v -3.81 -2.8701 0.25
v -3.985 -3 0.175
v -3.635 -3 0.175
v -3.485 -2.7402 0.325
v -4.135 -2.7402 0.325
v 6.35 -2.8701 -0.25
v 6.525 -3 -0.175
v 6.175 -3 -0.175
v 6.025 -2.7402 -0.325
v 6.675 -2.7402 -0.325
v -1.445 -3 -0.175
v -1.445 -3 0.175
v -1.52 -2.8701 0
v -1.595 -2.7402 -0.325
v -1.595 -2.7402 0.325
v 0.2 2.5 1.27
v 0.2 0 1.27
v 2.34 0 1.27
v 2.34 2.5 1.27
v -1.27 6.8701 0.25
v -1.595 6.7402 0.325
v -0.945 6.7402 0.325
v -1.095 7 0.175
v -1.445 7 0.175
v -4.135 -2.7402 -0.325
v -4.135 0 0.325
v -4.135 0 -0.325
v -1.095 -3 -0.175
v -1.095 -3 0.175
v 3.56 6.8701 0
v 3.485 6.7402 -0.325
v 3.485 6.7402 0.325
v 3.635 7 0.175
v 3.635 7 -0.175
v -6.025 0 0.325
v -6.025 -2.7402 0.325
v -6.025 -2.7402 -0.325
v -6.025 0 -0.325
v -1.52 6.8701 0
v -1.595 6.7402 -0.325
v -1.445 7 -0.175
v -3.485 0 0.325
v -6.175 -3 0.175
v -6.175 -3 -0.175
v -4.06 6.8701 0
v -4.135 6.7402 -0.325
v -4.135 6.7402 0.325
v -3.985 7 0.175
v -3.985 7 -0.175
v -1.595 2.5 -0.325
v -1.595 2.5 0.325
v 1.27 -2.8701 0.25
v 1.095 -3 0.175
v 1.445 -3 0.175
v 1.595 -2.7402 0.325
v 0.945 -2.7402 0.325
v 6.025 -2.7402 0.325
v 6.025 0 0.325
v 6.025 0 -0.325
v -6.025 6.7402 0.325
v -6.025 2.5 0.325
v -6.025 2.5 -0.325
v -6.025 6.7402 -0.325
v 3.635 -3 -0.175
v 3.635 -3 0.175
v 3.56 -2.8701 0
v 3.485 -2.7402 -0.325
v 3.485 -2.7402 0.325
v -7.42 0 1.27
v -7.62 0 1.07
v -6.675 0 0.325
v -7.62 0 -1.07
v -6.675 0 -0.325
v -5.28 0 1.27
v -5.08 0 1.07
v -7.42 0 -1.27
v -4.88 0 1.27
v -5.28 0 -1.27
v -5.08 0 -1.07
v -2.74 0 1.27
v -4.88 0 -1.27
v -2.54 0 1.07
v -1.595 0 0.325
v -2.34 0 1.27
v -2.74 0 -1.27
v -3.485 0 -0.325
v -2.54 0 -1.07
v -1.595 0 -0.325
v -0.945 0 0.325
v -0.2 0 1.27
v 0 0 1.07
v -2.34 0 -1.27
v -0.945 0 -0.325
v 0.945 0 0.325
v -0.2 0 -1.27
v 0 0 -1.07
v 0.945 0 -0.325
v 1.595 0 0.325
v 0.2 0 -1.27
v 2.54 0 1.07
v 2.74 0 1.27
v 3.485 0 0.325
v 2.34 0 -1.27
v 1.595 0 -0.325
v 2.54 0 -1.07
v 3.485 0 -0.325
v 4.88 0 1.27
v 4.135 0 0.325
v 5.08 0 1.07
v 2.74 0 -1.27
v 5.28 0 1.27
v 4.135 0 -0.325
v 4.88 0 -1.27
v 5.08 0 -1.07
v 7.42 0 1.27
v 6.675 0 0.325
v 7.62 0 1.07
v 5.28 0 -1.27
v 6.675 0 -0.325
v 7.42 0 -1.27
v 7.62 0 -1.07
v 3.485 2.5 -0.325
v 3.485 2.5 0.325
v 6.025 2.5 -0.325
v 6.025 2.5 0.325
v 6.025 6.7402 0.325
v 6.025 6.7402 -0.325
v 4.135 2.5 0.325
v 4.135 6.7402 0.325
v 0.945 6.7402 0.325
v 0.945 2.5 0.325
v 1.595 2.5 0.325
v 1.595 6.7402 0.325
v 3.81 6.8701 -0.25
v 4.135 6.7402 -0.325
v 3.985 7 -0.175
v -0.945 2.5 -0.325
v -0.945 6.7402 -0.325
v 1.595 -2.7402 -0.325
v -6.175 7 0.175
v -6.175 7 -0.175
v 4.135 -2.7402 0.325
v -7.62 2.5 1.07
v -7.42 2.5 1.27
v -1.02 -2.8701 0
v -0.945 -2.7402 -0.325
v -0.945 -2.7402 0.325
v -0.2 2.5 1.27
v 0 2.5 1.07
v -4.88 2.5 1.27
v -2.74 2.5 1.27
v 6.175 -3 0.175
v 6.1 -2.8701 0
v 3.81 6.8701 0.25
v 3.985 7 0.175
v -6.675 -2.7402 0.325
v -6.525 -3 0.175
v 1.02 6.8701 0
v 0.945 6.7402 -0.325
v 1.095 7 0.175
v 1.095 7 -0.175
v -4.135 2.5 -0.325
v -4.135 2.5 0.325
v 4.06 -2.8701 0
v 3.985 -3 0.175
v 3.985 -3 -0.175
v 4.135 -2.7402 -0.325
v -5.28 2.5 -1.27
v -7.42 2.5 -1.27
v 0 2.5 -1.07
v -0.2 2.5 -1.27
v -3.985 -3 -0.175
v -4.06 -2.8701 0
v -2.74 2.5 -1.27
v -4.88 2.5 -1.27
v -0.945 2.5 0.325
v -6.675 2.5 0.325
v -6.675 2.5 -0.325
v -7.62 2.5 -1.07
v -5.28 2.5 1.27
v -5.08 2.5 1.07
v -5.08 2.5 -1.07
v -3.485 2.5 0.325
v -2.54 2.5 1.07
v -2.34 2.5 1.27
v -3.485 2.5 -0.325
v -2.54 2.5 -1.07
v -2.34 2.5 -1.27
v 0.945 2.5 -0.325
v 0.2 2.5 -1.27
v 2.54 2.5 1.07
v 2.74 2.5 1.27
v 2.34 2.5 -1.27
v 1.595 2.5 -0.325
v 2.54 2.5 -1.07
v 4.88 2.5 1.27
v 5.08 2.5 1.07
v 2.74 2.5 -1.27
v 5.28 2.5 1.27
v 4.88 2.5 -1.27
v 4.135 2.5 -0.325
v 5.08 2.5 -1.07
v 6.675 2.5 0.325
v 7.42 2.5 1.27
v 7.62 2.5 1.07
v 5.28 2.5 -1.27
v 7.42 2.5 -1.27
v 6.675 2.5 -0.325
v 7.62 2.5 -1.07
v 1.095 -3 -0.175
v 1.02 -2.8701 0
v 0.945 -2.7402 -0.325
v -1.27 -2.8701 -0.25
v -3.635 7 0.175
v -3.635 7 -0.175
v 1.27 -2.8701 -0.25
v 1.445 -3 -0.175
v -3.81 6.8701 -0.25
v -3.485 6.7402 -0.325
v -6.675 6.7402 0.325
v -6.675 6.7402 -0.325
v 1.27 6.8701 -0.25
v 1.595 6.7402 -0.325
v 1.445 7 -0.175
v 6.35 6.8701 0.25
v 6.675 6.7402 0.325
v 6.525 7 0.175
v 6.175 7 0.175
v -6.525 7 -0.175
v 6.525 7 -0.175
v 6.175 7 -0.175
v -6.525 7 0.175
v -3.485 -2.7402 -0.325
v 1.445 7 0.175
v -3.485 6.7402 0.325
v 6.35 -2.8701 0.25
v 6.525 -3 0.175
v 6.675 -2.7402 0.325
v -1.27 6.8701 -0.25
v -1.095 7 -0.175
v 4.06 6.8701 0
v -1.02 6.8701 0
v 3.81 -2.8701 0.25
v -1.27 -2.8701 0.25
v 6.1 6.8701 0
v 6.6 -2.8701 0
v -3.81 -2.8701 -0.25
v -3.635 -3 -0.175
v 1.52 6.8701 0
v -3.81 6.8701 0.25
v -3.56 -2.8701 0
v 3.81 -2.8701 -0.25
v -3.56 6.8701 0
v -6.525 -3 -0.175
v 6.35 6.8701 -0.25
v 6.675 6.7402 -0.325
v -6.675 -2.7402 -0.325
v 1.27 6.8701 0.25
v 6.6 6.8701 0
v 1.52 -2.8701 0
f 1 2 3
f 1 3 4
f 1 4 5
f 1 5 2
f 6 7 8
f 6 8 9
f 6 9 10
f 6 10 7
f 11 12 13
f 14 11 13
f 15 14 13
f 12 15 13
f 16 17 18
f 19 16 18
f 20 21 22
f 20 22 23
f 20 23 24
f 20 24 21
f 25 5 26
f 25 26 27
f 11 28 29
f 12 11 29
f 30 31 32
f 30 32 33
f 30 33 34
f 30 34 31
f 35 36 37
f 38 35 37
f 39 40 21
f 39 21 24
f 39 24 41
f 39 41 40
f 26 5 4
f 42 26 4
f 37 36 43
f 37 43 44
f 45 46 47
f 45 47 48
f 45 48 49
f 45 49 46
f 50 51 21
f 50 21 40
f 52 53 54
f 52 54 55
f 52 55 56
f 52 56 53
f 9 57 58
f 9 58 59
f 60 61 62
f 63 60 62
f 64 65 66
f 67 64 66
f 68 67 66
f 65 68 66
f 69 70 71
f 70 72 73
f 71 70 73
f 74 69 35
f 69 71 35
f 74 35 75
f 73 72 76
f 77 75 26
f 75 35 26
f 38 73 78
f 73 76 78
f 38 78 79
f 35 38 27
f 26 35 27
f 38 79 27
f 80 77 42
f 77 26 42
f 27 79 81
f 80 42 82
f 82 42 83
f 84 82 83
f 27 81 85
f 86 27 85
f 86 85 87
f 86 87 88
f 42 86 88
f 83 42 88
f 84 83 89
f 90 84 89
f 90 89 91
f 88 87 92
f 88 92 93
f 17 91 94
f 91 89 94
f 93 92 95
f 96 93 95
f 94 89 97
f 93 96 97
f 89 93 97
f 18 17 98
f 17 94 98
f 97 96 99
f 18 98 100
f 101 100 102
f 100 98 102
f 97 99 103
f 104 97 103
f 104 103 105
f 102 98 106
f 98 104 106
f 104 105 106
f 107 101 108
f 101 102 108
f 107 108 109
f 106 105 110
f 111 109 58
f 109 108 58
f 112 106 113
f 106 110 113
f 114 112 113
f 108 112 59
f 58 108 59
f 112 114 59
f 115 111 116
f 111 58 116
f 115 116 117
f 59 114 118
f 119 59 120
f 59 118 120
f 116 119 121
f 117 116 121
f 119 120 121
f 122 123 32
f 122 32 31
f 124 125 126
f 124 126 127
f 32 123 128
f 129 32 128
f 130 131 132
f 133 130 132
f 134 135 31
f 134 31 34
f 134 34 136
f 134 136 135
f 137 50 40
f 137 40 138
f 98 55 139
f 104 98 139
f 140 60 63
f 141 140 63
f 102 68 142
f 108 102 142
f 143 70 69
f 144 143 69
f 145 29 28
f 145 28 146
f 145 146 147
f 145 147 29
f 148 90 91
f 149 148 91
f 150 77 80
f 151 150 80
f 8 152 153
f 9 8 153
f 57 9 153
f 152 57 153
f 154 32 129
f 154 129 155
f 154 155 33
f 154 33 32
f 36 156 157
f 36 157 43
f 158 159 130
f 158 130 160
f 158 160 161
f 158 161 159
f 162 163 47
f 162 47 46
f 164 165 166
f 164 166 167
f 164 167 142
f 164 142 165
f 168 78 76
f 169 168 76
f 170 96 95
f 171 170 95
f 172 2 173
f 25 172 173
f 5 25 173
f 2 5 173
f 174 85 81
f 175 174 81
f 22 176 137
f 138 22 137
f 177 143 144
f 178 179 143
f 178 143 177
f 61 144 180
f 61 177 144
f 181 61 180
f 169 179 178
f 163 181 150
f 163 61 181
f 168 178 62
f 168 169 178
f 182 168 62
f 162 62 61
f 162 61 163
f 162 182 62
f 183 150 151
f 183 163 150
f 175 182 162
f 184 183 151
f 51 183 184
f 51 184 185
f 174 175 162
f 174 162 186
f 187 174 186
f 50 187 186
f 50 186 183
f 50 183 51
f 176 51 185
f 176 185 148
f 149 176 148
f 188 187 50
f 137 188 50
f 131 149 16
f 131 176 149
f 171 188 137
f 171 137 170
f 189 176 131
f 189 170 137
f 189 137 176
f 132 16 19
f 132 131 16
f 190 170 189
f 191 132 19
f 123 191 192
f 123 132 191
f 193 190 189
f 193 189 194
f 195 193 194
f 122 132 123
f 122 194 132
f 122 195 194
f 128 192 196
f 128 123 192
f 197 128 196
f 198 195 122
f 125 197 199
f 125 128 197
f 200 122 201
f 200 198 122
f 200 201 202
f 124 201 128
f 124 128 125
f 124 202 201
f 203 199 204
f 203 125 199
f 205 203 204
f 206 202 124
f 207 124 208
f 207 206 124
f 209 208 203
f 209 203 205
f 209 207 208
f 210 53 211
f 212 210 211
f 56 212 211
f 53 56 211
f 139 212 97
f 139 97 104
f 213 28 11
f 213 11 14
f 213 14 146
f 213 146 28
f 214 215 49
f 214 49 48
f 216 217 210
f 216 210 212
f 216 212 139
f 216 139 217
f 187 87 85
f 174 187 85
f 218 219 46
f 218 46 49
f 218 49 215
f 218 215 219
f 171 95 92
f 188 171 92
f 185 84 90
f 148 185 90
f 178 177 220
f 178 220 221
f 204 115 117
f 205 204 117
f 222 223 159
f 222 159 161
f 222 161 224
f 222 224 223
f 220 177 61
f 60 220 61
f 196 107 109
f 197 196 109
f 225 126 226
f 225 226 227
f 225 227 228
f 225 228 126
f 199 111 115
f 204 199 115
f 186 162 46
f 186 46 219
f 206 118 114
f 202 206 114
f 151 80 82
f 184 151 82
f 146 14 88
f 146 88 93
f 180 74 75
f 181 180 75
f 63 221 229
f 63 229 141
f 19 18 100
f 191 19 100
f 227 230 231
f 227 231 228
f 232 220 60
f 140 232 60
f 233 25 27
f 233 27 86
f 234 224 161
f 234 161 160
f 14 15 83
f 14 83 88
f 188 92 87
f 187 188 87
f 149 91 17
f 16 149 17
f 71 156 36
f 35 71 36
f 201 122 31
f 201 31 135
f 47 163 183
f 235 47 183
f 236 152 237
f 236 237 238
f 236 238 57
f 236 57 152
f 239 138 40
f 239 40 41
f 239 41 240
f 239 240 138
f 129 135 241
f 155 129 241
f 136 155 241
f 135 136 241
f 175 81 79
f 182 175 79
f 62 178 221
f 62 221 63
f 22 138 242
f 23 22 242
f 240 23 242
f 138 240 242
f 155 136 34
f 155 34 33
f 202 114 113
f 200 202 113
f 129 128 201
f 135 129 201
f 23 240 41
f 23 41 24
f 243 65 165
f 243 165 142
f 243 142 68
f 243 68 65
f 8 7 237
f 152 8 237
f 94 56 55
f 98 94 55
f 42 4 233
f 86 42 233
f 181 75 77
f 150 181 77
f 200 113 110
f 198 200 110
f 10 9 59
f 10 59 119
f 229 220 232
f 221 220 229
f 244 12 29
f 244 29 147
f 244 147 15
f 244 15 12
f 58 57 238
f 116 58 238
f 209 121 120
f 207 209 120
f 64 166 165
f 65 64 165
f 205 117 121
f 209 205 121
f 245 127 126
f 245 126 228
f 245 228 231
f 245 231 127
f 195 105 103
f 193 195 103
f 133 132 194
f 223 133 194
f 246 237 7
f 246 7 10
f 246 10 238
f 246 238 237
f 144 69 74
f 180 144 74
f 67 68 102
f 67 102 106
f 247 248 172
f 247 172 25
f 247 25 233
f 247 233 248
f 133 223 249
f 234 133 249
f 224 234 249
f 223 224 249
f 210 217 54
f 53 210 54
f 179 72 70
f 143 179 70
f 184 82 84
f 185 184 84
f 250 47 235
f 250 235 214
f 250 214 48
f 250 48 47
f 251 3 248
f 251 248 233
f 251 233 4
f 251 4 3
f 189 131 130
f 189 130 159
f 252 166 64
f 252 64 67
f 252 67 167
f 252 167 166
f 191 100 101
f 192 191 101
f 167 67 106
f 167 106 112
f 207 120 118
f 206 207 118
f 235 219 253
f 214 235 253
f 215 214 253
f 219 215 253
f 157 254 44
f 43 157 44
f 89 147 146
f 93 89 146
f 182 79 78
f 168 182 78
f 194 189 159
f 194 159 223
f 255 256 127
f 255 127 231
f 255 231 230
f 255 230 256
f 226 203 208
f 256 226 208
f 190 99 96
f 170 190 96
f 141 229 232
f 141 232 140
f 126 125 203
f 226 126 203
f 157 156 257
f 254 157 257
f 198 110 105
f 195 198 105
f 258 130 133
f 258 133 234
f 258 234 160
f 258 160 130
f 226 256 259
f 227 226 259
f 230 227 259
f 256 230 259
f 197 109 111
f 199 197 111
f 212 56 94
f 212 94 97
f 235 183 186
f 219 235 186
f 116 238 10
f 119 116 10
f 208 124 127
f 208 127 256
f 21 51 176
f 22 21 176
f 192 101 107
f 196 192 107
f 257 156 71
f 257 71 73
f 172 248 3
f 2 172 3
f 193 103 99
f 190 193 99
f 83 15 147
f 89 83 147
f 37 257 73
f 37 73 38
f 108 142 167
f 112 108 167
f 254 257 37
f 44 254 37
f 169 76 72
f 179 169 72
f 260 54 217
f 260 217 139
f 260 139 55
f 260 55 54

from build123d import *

# Parameters (mm, degrees)
BOSS_EXTRUDE1_DEPTH   = 2.5
SKETCH3_W             = 0.65
SKETCH3_H             = 0.65
BOSS_EXTRUDE2_DEPTH   = 10
CHAMFER2_SIZE         = 0.15
CHAMFER2_SIZE2        = 0.259807621
CHAMFER3_SIZE         = 0.15
CHAMFER3_SIZE2        = 0.259807621
LPATTERN2_DEPTH       = 2.5
LPATTERN2_START       = -2.740192379
LPATTERN2_2_OUTLINE_W = 0.65
LPATTERN2_2_OUTLINE_H = 0.65
LPATTERN2_2_DEPTH     = 9.480384758


with BuildPart() as part:
    # Sketch1 → Boss-Extrude1 (new body)
    with BuildSketch(Plane(origin=(0, 0, 0), x_dir=(1, 0, 0), z_dir=(0, 1, 0))):
        Polygon((-7.42, 1.27), (-7.62, 1.07), (-7.62, -1.07), (-7.42, -1.27), (-5.28, -1.27), (-5.08, -1.07), (-5.08, 1.07), (-5.28, 1.27), align=None)
    extrude(amount=BOSS_EXTRUDE1_DEPTH)

    # Sketch3 → Boss-Extrude2 (add)
    with BuildSketch(Plane(origin=(0, -3, 0), x_dir=(1, 0, 0), z_dir=(0, 1, 0))):
        with Locations((-6.35, 0)):
            Rectangle(SKETCH3_W, SKETCH3_H)
    extrude(amount=BOSS_EXTRUDE2_DEPTH)

    # Chamfer2
    chamfer2_edges = [part.edges().sort_by_distance(p)[0] for p in [
        (-6.025, -3, 0),
        (-6.35, -3, -0.325),
        (-6.675, -3, 0),
        (-6.35, -3, 0.325),
    ]]
    chamfer2_side = [part.faces().sort_by_distance(p)[0] for p in [
        (-6.35, -3, 0),
    ]]
    chamfer(chamfer2_edges, length=CHAMFER2_SIZE, length2=CHAMFER2_SIZE2, reference=chamfer2_side[0])

    # Chamfer3
    chamfer3_edges = [part.edges().sort_by_distance(p)[0] for p in [
        (-6.025, 7, 0),
        (-6.35, 7, -0.325),
        (-6.675, 7, 0),
        (-6.35, 7, 0.325),
    ]]
    chamfer3_side = [part.faces().sort_by_distance(p)[0] for p in [
        (-6.35, 7, 0),
    ]]
    chamfer(chamfer3_edges, length=CHAMFER3_SIZE, length2=CHAMFER3_SIZE2, reference=chamfer3_side[0])

    # LPattern2: read off the stored shape, not the designer's step
    # LPattern2 outline → LPattern2 (add)
    with BuildSketch(Plane(origin=(0, 0, 0), x_dir=(1, 0, 0), z_dir=(0, 1, 0))):
        Polygon((-2.74, 1.27), (-4.88, 1.27), (-5.08, 1.07), (-5.08, -1.07), (-4.88, -1.27), (-2.74, -1.27), (-2.54, -1.07), (-2.34, -1.27), (-0.2, -1.27), (0, -1.07), (0.2, -1.27), (2.34, -1.27), (2.54, -1.07), (2.74, -1.27), (4.88, -1.27), (5.08, -1.07), (5.28, -1.27), (7.42, -1.27), (7.62, -1.07), (7.62, 1.07), (7.42, 1.27), (5.28, 1.27), (5.08, 1.07), (4.88, 1.27), (2.74, 1.27), (2.54, 1.07), (2.34, 1.27), (0.2, 1.27), (0, 1.07), (-0.2, 1.27), (-2.34, 1.27), (-2.54, 1.07), align=None)
    extrude(amount=LPATTERN2_DEPTH)

    # LPattern2 2 outline → LPattern2 2 (add)
    with BuildSketch(Plane(origin=(0, 0, 0), x_dir=(1, 0, 0), z_dir=(0, 1, 0)).offset(LPATTERN2_START)):
        with Locations((-3.81, 0)):
            Rectangle(LPATTERN2_2_OUTLINE_W, LPATTERN2_2_OUTLINE_H)
        with Locations((-1.27, 0)):
            Rectangle(LPATTERN2_2_OUTLINE_W, LPATTERN2_2_OUTLINE_H)
        with Locations((1.27, 0)):
            Rectangle(LPATTERN2_2_OUTLINE_W, LPATTERN2_2_OUTLINE_H)
        with Locations((3.81, 0)):
            Rectangle(LPATTERN2_2_OUTLINE_W, LPATTERN2_2_OUTLINE_H)
        with Locations((6.35, 0)):
            Rectangle(LPATTERN2_2_OUTLINE_W, LPATTERN2_2_OUTLINE_H)
    extrude(amount=LPATTERN2_2_DEPTH)

    # LPattern2 3: loft between two sections, ruled curve by curve
    lpattern2_3_from = [
        Edge.make_line((-3.985, -3, 0.175), (-3.635, -3, 0.175)),
        Edge.make_line((-3.635, -3, -0.175), (-3.985, -3, -0.175)),
        Edge.make_line((-3.635, -3, 0.175), (-3.635, -3, -0.175)),
        Edge.make_line((-3.985, -3, 0.175), (-3.985, -3, -0.175)),
    ]
    lpattern2_3_to = [
        Edge.make_line((-4.135, -2.740192379, 0.325), (-3.485, -2.740192379, 0.325)),
        Edge.make_line((-3.485, -2.740192379, -0.325), (-4.135, -2.740192379, -0.325)),
        Edge.make_line((-3.485, -2.740192379, 0.325), (-3.485, -2.740192379, -0.325)),
        Edge.make_line((-4.135, -2.740192379, 0.325), (-4.135, -2.740192379, -0.325)),
    ]
    lpattern2_3 = Solid(Shell([*[Face.make_surface_from_curves(lpattern2_3_from[k], lpattern2_3_to[k]) for k in range(4)], Face(Wire(lpattern2_3_from)), Face(Wire(lpattern2_3_to))]))
    add(lpattern2_3)

    # LPattern2 4: loft between two sections, ruled curve by curve
    lpattern2_4_from = [
        Edge.make_line((-1.445, -3, 0.175), (-1.095, -3, 0.175)),
        Edge.make_line((-1.095, -3, -0.175), (-1.445, -3, -0.175)),
        Edge.make_line((-1.095, -3, 0.175), (-1.095, -3, -0.175)),
        Edge.make_line((-1.445, -3, 0.175), (-1.445, -3, -0.175)),
    ]
    lpattern2_4_to = [
        Edge.make_line((-1.595, -2.740192379, 0.325), (-0.945, -2.740192379, 0.325)),
        Edge.make_line((-0.945, -2.740192379, -0.325), (-1.595, -2.740192379, -0.325)),
        Edge.make_line((-0.945, -2.740192379, 0.325), (-0.945, -2.740192379, -0.325)),
        Edge.make_line((-1.595, -2.740192379, 0.325), (-1.595, -2.740192379, -0.325)),
    ]
    lpattern2_4 = Solid(Shell([*[Face.make_surface_from_curves(lpattern2_4_from[k], lpattern2_4_to[k]) for k in range(4)], Face(Wire(lpattern2_4_from)), Face(Wire(lpattern2_4_to))]))
    add(lpattern2_4)

    # LPattern2 5: loft between two sections, ruled curve by curve
    lpattern2_5_from = [
        Edge.make_line((1.095, -3, 0.175), (1.445, -3, 0.175)),
        Edge.make_line((1.445, -3, -0.175), (1.095, -3, -0.175)),
        Edge.make_line((1.445, -3, 0.175), (1.445, -3, -0.175)),
        Edge.make_line((1.095, -3, 0.175), (1.095, -3, -0.175)),
    ]
    lpattern2_5_to = [
        Edge.make_line((0.945, -2.740192379, 0.325), (1.595, -2.740192379, 0.325)),
        Edge.make_line((1.595, -2.740192379, -0.325), (0.945, -2.740192379, -0.325)),
        Edge.make_line((1.595, -2.740192379, 0.325), (1.595, -2.740192379, -0.325)),
        Edge.make_line((0.945, -2.740192379, 0.325), (0.945, -2.740192379, -0.325)),
    ]
    lpattern2_5 = Solid(Shell([*[Face.make_surface_from_curves(lpattern2_5_from[k], lpattern2_5_to[k]) for k in range(4)], Face(Wire(lpattern2_5_from)), Face(Wire(lpattern2_5_to))]))
    add(lpattern2_5)

    # LPattern2 6: loft between two sections, ruled curve by curve
    lpattern2_6_from = [
        Edge.make_line((3.635, -3, 0.175), (3.985, -3, 0.175)),
        Edge.make_line((3.985, -3, -0.175), (3.635, -3, -0.175)),
        Edge.make_line((3.985, -3, 0.175), (3.985, -3, -0.175)),
        Edge.make_line((3.635, -3, 0.175), (3.635, -3, -0.175)),
    ]
    lpattern2_6_to = [
        Edge.make_line((3.485, -2.740192379, 0.325), (4.135, -2.740192379, 0.325)),
        Edge.make_line((4.135, -2.740192379, -0.325), (3.485, -2.740192379, -0.325)),
        Edge.make_line((4.135, -2.740192379, 0.325), (4.135, -2.740192379, -0.325)),
        Edge.make_line((3.485, -2.740192379, 0.325), (3.485, -2.740192379, -0.325)),
    ]
    lpattern2_6 = Solid(Shell([*[Face.make_surface_from_curves(lpattern2_6_from[k], lpattern2_6_to[k]) for k in range(4)], Face(Wire(lpattern2_6_from)), Face(Wire(lpattern2_6_to))]))
    add(lpattern2_6)

    # LPattern2 7: loft between two sections, ruled curve by curve
    lpattern2_7_from = [
        Edge.make_line((6.175, -3, 0.175), (6.525, -3, 0.175)),
        Edge.make_line((6.525, -3, -0.175), (6.175, -3, -0.175)),
        Edge.make_line((6.525, -3, 0.175), (6.525, -3, -0.175)),
        Edge.make_line((6.175, -3, 0.175), (6.175, -3, -0.175)),
    ]
    lpattern2_7_to = [
        Edge.make_line((6.025, -2.740192379, 0.325), (6.675, -2.740192379, 0.325)),
        Edge.make_line((6.675, -2.740192379, -0.325), (6.025, -2.740192379, -0.325)),
        Edge.make_line((6.675, -2.740192379, 0.325), (6.675, -2.740192379, -0.325)),
        Edge.make_line((6.025, -2.740192379, 0.325), (6.025, -2.740192379, -0.325)),
    ]
    lpattern2_7 = Solid(Shell([*[Face.make_surface_from_curves(lpattern2_7_from[k], lpattern2_7_to[k]) for k in range(4)], Face(Wire(lpattern2_7_from)), Face(Wire(lpattern2_7_to))]))
    add(lpattern2_7)

    # LPattern2 8: loft between two sections, ruled curve by curve
    lpattern2_8_from = [
        Edge.make_line((-3.485, 6.740192379, -0.325), (-4.135, 6.740192379, -0.325)),
        Edge.make_line((-4.135, 6.740192379, 0.325), (-3.485, 6.740192379, 0.325)),
        Edge.make_line((-4.135, 6.740192379, -0.325), (-4.135, 6.740192379, 0.325)),
        Edge.make_line((-3.485, 6.740192379, -0.325), (-3.485, 6.740192379, 0.325)),
    ]
    lpattern2_8_to = [
        Edge.make_line((-3.635, 7, -0.175), (-3.985, 7, -0.175)),
        Edge.make_line((-3.985, 7, 0.175), (-3.635, 7, 0.175)),
        Edge.make_line((-3.985, 7, -0.175), (-3.985, 7, 0.175)),
        Edge.make_line((-3.635, 7, -0.175), (-3.635, 7, 0.175)),
    ]
    lpattern2_8 = Solid(Shell([*[Face.make_surface_from_curves(lpattern2_8_from[k], lpattern2_8_to[k]) for k in range(4)], Face(Wire(lpattern2_8_from)), Face(Wire(lpattern2_8_to))]))
    add(lpattern2_8)

    # LPattern2 9: loft between two sections, ruled curve by curve
    lpattern2_9_from = [
        Edge.make_line((-0.945, 6.740192379, -0.325), (-1.595, 6.740192379, -0.325)),
        Edge.make_line((-1.595, 6.740192379, 0.325), (-0.945, 6.740192379, 0.325)),
        Edge.make_line((-1.595, 6.740192379, -0.325), (-1.595, 6.740192379, 0.325)),
        Edge.make_line((-0.945, 6.740192379, -0.325), (-0.945, 6.740192379, 0.325)),
    ]
    lpattern2_9_to = [
        Edge.make_line((-1.095, 7, -0.175), (-1.445, 7, -0.175)),
        Edge.make_line((-1.445, 7, 0.175), (-1.095, 7, 0.175)),
        Edge.make_line((-1.445, 7, -0.175), (-1.445, 7, 0.175)),
        Edge.make_line((-1.095, 7, -0.175), (-1.095, 7, 0.175)),
    ]
    lpattern2_9 = Solid(Shell([*[Face.make_surface_from_curves(lpattern2_9_from[k], lpattern2_9_to[k]) for k in range(4)], Face(Wire(lpattern2_9_from)), Face(Wire(lpattern2_9_to))]))
    add(lpattern2_9)

    # LPattern2 10: loft between two sections, ruled curve by curve
    lpattern2_10_from = [
        Edge.make_line((1.595, 6.740192379, -0.325), (0.945, 6.740192379, -0.325)),
        Edge.make_line((0.945, 6.740192379, 0.325), (1.595, 6.740192379, 0.325)),
        Edge.make_line((0.945, 6.740192379, -0.325), (0.945, 6.740192379, 0.325)),
        Edge.make_line((1.595, 6.740192379, -0.325), (1.595, 6.740192379, 0.325)),
    ]
    lpattern2_10_to = [
        Edge.make_line((1.445, 7, -0.175), (1.095, 7, -0.175)),
        Edge.make_line((1.095, 7, 0.175), (1.445, 7, 0.175)),
        Edge.make_line((1.095, 7, -0.175), (1.095, 7, 0.175)),
        Edge.make_line((1.445, 7, -0.175), (1.445, 7, 0.175)),
    ]
    lpattern2_10 = Solid(Shell([*[Face.make_surface_from_curves(lpattern2_10_from[k], lpattern2_10_to[k]) for k in range(4)], Face(Wire(lpattern2_10_from)), Face(Wire(lpattern2_10_to))]))
    add(lpattern2_10)

    # LPattern2 11: loft between two sections, ruled curve by curve
    lpattern2_11_from = [
        Edge.make_line((4.135, 6.740192379, -0.325), (3.485, 6.740192379, -0.325)),
        Edge.make_line((3.485, 6.740192379, 0.325), (4.135, 6.740192379, 0.325)),
        Edge.make_line((3.485, 6.740192379, -0.325), (3.485, 6.740192379, 0.325)),
        Edge.make_line((4.135, 6.740192379, -0.325), (4.135, 6.740192379, 0.325)),
    ]
    lpattern2_11_to = [
        Edge.make_line((3.985, 7, -0.175), (3.635, 7, -0.175)),
        Edge.make_line((3.635, 7, 0.175), (3.985, 7, 0.175)),
        Edge.make_line((3.635, 7, -0.175), (3.635, 7, 0.175)),
        Edge.make_line((3.985, 7, -0.175), (3.985, 7, 0.175)),
    ]
    lpattern2_11 = Solid(Shell([*[Face.make_surface_from_curves(lpattern2_11_from[k], lpattern2_11_to[k]) for k in range(4)], Face(Wire(lpattern2_11_from)), Face(Wire(lpattern2_11_to))]))
    add(lpattern2_11)

    # LPattern2 12: loft between two sections, ruled curve by curve
    lpattern2_12_from = [
        Edge.make_line((6.675, 6.740192379, -0.325), (6.025, 6.740192379, -0.325)),
        Edge.make_line((6.025, 6.740192379, 0.325), (6.675, 6.740192379, 0.325)),
        Edge.make_line((6.025, 6.740192379, -0.325), (6.025, 6.740192379, 0.325)),
        Edge.make_line((6.675, 6.740192379, -0.325), (6.675, 6.740192379, 0.325)),
    ]
    lpattern2_12_to = [
        Edge.make_line((6.525, 7, -0.175), (6.175, 7, -0.175)),
        Edge.make_line((6.175, 7, 0.175), (6.525, 7, 0.175)),
        Edge.make_line((6.175, 7, -0.175), (6.175, 7, 0.175)),
        Edge.make_line((6.525, 7, -0.175), (6.525, 7, 0.175)),
    ]
    lpattern2_12 = Solid(Shell([*[Face.make_surface_from_curves(lpattern2_12_from[k], lpattern2_12_to[k]) for k in range(4)], Face(Wire(lpattern2_12_from)), Face(Wire(lpattern2_12_to))]))
    add(lpattern2_12)


solid = part.part
